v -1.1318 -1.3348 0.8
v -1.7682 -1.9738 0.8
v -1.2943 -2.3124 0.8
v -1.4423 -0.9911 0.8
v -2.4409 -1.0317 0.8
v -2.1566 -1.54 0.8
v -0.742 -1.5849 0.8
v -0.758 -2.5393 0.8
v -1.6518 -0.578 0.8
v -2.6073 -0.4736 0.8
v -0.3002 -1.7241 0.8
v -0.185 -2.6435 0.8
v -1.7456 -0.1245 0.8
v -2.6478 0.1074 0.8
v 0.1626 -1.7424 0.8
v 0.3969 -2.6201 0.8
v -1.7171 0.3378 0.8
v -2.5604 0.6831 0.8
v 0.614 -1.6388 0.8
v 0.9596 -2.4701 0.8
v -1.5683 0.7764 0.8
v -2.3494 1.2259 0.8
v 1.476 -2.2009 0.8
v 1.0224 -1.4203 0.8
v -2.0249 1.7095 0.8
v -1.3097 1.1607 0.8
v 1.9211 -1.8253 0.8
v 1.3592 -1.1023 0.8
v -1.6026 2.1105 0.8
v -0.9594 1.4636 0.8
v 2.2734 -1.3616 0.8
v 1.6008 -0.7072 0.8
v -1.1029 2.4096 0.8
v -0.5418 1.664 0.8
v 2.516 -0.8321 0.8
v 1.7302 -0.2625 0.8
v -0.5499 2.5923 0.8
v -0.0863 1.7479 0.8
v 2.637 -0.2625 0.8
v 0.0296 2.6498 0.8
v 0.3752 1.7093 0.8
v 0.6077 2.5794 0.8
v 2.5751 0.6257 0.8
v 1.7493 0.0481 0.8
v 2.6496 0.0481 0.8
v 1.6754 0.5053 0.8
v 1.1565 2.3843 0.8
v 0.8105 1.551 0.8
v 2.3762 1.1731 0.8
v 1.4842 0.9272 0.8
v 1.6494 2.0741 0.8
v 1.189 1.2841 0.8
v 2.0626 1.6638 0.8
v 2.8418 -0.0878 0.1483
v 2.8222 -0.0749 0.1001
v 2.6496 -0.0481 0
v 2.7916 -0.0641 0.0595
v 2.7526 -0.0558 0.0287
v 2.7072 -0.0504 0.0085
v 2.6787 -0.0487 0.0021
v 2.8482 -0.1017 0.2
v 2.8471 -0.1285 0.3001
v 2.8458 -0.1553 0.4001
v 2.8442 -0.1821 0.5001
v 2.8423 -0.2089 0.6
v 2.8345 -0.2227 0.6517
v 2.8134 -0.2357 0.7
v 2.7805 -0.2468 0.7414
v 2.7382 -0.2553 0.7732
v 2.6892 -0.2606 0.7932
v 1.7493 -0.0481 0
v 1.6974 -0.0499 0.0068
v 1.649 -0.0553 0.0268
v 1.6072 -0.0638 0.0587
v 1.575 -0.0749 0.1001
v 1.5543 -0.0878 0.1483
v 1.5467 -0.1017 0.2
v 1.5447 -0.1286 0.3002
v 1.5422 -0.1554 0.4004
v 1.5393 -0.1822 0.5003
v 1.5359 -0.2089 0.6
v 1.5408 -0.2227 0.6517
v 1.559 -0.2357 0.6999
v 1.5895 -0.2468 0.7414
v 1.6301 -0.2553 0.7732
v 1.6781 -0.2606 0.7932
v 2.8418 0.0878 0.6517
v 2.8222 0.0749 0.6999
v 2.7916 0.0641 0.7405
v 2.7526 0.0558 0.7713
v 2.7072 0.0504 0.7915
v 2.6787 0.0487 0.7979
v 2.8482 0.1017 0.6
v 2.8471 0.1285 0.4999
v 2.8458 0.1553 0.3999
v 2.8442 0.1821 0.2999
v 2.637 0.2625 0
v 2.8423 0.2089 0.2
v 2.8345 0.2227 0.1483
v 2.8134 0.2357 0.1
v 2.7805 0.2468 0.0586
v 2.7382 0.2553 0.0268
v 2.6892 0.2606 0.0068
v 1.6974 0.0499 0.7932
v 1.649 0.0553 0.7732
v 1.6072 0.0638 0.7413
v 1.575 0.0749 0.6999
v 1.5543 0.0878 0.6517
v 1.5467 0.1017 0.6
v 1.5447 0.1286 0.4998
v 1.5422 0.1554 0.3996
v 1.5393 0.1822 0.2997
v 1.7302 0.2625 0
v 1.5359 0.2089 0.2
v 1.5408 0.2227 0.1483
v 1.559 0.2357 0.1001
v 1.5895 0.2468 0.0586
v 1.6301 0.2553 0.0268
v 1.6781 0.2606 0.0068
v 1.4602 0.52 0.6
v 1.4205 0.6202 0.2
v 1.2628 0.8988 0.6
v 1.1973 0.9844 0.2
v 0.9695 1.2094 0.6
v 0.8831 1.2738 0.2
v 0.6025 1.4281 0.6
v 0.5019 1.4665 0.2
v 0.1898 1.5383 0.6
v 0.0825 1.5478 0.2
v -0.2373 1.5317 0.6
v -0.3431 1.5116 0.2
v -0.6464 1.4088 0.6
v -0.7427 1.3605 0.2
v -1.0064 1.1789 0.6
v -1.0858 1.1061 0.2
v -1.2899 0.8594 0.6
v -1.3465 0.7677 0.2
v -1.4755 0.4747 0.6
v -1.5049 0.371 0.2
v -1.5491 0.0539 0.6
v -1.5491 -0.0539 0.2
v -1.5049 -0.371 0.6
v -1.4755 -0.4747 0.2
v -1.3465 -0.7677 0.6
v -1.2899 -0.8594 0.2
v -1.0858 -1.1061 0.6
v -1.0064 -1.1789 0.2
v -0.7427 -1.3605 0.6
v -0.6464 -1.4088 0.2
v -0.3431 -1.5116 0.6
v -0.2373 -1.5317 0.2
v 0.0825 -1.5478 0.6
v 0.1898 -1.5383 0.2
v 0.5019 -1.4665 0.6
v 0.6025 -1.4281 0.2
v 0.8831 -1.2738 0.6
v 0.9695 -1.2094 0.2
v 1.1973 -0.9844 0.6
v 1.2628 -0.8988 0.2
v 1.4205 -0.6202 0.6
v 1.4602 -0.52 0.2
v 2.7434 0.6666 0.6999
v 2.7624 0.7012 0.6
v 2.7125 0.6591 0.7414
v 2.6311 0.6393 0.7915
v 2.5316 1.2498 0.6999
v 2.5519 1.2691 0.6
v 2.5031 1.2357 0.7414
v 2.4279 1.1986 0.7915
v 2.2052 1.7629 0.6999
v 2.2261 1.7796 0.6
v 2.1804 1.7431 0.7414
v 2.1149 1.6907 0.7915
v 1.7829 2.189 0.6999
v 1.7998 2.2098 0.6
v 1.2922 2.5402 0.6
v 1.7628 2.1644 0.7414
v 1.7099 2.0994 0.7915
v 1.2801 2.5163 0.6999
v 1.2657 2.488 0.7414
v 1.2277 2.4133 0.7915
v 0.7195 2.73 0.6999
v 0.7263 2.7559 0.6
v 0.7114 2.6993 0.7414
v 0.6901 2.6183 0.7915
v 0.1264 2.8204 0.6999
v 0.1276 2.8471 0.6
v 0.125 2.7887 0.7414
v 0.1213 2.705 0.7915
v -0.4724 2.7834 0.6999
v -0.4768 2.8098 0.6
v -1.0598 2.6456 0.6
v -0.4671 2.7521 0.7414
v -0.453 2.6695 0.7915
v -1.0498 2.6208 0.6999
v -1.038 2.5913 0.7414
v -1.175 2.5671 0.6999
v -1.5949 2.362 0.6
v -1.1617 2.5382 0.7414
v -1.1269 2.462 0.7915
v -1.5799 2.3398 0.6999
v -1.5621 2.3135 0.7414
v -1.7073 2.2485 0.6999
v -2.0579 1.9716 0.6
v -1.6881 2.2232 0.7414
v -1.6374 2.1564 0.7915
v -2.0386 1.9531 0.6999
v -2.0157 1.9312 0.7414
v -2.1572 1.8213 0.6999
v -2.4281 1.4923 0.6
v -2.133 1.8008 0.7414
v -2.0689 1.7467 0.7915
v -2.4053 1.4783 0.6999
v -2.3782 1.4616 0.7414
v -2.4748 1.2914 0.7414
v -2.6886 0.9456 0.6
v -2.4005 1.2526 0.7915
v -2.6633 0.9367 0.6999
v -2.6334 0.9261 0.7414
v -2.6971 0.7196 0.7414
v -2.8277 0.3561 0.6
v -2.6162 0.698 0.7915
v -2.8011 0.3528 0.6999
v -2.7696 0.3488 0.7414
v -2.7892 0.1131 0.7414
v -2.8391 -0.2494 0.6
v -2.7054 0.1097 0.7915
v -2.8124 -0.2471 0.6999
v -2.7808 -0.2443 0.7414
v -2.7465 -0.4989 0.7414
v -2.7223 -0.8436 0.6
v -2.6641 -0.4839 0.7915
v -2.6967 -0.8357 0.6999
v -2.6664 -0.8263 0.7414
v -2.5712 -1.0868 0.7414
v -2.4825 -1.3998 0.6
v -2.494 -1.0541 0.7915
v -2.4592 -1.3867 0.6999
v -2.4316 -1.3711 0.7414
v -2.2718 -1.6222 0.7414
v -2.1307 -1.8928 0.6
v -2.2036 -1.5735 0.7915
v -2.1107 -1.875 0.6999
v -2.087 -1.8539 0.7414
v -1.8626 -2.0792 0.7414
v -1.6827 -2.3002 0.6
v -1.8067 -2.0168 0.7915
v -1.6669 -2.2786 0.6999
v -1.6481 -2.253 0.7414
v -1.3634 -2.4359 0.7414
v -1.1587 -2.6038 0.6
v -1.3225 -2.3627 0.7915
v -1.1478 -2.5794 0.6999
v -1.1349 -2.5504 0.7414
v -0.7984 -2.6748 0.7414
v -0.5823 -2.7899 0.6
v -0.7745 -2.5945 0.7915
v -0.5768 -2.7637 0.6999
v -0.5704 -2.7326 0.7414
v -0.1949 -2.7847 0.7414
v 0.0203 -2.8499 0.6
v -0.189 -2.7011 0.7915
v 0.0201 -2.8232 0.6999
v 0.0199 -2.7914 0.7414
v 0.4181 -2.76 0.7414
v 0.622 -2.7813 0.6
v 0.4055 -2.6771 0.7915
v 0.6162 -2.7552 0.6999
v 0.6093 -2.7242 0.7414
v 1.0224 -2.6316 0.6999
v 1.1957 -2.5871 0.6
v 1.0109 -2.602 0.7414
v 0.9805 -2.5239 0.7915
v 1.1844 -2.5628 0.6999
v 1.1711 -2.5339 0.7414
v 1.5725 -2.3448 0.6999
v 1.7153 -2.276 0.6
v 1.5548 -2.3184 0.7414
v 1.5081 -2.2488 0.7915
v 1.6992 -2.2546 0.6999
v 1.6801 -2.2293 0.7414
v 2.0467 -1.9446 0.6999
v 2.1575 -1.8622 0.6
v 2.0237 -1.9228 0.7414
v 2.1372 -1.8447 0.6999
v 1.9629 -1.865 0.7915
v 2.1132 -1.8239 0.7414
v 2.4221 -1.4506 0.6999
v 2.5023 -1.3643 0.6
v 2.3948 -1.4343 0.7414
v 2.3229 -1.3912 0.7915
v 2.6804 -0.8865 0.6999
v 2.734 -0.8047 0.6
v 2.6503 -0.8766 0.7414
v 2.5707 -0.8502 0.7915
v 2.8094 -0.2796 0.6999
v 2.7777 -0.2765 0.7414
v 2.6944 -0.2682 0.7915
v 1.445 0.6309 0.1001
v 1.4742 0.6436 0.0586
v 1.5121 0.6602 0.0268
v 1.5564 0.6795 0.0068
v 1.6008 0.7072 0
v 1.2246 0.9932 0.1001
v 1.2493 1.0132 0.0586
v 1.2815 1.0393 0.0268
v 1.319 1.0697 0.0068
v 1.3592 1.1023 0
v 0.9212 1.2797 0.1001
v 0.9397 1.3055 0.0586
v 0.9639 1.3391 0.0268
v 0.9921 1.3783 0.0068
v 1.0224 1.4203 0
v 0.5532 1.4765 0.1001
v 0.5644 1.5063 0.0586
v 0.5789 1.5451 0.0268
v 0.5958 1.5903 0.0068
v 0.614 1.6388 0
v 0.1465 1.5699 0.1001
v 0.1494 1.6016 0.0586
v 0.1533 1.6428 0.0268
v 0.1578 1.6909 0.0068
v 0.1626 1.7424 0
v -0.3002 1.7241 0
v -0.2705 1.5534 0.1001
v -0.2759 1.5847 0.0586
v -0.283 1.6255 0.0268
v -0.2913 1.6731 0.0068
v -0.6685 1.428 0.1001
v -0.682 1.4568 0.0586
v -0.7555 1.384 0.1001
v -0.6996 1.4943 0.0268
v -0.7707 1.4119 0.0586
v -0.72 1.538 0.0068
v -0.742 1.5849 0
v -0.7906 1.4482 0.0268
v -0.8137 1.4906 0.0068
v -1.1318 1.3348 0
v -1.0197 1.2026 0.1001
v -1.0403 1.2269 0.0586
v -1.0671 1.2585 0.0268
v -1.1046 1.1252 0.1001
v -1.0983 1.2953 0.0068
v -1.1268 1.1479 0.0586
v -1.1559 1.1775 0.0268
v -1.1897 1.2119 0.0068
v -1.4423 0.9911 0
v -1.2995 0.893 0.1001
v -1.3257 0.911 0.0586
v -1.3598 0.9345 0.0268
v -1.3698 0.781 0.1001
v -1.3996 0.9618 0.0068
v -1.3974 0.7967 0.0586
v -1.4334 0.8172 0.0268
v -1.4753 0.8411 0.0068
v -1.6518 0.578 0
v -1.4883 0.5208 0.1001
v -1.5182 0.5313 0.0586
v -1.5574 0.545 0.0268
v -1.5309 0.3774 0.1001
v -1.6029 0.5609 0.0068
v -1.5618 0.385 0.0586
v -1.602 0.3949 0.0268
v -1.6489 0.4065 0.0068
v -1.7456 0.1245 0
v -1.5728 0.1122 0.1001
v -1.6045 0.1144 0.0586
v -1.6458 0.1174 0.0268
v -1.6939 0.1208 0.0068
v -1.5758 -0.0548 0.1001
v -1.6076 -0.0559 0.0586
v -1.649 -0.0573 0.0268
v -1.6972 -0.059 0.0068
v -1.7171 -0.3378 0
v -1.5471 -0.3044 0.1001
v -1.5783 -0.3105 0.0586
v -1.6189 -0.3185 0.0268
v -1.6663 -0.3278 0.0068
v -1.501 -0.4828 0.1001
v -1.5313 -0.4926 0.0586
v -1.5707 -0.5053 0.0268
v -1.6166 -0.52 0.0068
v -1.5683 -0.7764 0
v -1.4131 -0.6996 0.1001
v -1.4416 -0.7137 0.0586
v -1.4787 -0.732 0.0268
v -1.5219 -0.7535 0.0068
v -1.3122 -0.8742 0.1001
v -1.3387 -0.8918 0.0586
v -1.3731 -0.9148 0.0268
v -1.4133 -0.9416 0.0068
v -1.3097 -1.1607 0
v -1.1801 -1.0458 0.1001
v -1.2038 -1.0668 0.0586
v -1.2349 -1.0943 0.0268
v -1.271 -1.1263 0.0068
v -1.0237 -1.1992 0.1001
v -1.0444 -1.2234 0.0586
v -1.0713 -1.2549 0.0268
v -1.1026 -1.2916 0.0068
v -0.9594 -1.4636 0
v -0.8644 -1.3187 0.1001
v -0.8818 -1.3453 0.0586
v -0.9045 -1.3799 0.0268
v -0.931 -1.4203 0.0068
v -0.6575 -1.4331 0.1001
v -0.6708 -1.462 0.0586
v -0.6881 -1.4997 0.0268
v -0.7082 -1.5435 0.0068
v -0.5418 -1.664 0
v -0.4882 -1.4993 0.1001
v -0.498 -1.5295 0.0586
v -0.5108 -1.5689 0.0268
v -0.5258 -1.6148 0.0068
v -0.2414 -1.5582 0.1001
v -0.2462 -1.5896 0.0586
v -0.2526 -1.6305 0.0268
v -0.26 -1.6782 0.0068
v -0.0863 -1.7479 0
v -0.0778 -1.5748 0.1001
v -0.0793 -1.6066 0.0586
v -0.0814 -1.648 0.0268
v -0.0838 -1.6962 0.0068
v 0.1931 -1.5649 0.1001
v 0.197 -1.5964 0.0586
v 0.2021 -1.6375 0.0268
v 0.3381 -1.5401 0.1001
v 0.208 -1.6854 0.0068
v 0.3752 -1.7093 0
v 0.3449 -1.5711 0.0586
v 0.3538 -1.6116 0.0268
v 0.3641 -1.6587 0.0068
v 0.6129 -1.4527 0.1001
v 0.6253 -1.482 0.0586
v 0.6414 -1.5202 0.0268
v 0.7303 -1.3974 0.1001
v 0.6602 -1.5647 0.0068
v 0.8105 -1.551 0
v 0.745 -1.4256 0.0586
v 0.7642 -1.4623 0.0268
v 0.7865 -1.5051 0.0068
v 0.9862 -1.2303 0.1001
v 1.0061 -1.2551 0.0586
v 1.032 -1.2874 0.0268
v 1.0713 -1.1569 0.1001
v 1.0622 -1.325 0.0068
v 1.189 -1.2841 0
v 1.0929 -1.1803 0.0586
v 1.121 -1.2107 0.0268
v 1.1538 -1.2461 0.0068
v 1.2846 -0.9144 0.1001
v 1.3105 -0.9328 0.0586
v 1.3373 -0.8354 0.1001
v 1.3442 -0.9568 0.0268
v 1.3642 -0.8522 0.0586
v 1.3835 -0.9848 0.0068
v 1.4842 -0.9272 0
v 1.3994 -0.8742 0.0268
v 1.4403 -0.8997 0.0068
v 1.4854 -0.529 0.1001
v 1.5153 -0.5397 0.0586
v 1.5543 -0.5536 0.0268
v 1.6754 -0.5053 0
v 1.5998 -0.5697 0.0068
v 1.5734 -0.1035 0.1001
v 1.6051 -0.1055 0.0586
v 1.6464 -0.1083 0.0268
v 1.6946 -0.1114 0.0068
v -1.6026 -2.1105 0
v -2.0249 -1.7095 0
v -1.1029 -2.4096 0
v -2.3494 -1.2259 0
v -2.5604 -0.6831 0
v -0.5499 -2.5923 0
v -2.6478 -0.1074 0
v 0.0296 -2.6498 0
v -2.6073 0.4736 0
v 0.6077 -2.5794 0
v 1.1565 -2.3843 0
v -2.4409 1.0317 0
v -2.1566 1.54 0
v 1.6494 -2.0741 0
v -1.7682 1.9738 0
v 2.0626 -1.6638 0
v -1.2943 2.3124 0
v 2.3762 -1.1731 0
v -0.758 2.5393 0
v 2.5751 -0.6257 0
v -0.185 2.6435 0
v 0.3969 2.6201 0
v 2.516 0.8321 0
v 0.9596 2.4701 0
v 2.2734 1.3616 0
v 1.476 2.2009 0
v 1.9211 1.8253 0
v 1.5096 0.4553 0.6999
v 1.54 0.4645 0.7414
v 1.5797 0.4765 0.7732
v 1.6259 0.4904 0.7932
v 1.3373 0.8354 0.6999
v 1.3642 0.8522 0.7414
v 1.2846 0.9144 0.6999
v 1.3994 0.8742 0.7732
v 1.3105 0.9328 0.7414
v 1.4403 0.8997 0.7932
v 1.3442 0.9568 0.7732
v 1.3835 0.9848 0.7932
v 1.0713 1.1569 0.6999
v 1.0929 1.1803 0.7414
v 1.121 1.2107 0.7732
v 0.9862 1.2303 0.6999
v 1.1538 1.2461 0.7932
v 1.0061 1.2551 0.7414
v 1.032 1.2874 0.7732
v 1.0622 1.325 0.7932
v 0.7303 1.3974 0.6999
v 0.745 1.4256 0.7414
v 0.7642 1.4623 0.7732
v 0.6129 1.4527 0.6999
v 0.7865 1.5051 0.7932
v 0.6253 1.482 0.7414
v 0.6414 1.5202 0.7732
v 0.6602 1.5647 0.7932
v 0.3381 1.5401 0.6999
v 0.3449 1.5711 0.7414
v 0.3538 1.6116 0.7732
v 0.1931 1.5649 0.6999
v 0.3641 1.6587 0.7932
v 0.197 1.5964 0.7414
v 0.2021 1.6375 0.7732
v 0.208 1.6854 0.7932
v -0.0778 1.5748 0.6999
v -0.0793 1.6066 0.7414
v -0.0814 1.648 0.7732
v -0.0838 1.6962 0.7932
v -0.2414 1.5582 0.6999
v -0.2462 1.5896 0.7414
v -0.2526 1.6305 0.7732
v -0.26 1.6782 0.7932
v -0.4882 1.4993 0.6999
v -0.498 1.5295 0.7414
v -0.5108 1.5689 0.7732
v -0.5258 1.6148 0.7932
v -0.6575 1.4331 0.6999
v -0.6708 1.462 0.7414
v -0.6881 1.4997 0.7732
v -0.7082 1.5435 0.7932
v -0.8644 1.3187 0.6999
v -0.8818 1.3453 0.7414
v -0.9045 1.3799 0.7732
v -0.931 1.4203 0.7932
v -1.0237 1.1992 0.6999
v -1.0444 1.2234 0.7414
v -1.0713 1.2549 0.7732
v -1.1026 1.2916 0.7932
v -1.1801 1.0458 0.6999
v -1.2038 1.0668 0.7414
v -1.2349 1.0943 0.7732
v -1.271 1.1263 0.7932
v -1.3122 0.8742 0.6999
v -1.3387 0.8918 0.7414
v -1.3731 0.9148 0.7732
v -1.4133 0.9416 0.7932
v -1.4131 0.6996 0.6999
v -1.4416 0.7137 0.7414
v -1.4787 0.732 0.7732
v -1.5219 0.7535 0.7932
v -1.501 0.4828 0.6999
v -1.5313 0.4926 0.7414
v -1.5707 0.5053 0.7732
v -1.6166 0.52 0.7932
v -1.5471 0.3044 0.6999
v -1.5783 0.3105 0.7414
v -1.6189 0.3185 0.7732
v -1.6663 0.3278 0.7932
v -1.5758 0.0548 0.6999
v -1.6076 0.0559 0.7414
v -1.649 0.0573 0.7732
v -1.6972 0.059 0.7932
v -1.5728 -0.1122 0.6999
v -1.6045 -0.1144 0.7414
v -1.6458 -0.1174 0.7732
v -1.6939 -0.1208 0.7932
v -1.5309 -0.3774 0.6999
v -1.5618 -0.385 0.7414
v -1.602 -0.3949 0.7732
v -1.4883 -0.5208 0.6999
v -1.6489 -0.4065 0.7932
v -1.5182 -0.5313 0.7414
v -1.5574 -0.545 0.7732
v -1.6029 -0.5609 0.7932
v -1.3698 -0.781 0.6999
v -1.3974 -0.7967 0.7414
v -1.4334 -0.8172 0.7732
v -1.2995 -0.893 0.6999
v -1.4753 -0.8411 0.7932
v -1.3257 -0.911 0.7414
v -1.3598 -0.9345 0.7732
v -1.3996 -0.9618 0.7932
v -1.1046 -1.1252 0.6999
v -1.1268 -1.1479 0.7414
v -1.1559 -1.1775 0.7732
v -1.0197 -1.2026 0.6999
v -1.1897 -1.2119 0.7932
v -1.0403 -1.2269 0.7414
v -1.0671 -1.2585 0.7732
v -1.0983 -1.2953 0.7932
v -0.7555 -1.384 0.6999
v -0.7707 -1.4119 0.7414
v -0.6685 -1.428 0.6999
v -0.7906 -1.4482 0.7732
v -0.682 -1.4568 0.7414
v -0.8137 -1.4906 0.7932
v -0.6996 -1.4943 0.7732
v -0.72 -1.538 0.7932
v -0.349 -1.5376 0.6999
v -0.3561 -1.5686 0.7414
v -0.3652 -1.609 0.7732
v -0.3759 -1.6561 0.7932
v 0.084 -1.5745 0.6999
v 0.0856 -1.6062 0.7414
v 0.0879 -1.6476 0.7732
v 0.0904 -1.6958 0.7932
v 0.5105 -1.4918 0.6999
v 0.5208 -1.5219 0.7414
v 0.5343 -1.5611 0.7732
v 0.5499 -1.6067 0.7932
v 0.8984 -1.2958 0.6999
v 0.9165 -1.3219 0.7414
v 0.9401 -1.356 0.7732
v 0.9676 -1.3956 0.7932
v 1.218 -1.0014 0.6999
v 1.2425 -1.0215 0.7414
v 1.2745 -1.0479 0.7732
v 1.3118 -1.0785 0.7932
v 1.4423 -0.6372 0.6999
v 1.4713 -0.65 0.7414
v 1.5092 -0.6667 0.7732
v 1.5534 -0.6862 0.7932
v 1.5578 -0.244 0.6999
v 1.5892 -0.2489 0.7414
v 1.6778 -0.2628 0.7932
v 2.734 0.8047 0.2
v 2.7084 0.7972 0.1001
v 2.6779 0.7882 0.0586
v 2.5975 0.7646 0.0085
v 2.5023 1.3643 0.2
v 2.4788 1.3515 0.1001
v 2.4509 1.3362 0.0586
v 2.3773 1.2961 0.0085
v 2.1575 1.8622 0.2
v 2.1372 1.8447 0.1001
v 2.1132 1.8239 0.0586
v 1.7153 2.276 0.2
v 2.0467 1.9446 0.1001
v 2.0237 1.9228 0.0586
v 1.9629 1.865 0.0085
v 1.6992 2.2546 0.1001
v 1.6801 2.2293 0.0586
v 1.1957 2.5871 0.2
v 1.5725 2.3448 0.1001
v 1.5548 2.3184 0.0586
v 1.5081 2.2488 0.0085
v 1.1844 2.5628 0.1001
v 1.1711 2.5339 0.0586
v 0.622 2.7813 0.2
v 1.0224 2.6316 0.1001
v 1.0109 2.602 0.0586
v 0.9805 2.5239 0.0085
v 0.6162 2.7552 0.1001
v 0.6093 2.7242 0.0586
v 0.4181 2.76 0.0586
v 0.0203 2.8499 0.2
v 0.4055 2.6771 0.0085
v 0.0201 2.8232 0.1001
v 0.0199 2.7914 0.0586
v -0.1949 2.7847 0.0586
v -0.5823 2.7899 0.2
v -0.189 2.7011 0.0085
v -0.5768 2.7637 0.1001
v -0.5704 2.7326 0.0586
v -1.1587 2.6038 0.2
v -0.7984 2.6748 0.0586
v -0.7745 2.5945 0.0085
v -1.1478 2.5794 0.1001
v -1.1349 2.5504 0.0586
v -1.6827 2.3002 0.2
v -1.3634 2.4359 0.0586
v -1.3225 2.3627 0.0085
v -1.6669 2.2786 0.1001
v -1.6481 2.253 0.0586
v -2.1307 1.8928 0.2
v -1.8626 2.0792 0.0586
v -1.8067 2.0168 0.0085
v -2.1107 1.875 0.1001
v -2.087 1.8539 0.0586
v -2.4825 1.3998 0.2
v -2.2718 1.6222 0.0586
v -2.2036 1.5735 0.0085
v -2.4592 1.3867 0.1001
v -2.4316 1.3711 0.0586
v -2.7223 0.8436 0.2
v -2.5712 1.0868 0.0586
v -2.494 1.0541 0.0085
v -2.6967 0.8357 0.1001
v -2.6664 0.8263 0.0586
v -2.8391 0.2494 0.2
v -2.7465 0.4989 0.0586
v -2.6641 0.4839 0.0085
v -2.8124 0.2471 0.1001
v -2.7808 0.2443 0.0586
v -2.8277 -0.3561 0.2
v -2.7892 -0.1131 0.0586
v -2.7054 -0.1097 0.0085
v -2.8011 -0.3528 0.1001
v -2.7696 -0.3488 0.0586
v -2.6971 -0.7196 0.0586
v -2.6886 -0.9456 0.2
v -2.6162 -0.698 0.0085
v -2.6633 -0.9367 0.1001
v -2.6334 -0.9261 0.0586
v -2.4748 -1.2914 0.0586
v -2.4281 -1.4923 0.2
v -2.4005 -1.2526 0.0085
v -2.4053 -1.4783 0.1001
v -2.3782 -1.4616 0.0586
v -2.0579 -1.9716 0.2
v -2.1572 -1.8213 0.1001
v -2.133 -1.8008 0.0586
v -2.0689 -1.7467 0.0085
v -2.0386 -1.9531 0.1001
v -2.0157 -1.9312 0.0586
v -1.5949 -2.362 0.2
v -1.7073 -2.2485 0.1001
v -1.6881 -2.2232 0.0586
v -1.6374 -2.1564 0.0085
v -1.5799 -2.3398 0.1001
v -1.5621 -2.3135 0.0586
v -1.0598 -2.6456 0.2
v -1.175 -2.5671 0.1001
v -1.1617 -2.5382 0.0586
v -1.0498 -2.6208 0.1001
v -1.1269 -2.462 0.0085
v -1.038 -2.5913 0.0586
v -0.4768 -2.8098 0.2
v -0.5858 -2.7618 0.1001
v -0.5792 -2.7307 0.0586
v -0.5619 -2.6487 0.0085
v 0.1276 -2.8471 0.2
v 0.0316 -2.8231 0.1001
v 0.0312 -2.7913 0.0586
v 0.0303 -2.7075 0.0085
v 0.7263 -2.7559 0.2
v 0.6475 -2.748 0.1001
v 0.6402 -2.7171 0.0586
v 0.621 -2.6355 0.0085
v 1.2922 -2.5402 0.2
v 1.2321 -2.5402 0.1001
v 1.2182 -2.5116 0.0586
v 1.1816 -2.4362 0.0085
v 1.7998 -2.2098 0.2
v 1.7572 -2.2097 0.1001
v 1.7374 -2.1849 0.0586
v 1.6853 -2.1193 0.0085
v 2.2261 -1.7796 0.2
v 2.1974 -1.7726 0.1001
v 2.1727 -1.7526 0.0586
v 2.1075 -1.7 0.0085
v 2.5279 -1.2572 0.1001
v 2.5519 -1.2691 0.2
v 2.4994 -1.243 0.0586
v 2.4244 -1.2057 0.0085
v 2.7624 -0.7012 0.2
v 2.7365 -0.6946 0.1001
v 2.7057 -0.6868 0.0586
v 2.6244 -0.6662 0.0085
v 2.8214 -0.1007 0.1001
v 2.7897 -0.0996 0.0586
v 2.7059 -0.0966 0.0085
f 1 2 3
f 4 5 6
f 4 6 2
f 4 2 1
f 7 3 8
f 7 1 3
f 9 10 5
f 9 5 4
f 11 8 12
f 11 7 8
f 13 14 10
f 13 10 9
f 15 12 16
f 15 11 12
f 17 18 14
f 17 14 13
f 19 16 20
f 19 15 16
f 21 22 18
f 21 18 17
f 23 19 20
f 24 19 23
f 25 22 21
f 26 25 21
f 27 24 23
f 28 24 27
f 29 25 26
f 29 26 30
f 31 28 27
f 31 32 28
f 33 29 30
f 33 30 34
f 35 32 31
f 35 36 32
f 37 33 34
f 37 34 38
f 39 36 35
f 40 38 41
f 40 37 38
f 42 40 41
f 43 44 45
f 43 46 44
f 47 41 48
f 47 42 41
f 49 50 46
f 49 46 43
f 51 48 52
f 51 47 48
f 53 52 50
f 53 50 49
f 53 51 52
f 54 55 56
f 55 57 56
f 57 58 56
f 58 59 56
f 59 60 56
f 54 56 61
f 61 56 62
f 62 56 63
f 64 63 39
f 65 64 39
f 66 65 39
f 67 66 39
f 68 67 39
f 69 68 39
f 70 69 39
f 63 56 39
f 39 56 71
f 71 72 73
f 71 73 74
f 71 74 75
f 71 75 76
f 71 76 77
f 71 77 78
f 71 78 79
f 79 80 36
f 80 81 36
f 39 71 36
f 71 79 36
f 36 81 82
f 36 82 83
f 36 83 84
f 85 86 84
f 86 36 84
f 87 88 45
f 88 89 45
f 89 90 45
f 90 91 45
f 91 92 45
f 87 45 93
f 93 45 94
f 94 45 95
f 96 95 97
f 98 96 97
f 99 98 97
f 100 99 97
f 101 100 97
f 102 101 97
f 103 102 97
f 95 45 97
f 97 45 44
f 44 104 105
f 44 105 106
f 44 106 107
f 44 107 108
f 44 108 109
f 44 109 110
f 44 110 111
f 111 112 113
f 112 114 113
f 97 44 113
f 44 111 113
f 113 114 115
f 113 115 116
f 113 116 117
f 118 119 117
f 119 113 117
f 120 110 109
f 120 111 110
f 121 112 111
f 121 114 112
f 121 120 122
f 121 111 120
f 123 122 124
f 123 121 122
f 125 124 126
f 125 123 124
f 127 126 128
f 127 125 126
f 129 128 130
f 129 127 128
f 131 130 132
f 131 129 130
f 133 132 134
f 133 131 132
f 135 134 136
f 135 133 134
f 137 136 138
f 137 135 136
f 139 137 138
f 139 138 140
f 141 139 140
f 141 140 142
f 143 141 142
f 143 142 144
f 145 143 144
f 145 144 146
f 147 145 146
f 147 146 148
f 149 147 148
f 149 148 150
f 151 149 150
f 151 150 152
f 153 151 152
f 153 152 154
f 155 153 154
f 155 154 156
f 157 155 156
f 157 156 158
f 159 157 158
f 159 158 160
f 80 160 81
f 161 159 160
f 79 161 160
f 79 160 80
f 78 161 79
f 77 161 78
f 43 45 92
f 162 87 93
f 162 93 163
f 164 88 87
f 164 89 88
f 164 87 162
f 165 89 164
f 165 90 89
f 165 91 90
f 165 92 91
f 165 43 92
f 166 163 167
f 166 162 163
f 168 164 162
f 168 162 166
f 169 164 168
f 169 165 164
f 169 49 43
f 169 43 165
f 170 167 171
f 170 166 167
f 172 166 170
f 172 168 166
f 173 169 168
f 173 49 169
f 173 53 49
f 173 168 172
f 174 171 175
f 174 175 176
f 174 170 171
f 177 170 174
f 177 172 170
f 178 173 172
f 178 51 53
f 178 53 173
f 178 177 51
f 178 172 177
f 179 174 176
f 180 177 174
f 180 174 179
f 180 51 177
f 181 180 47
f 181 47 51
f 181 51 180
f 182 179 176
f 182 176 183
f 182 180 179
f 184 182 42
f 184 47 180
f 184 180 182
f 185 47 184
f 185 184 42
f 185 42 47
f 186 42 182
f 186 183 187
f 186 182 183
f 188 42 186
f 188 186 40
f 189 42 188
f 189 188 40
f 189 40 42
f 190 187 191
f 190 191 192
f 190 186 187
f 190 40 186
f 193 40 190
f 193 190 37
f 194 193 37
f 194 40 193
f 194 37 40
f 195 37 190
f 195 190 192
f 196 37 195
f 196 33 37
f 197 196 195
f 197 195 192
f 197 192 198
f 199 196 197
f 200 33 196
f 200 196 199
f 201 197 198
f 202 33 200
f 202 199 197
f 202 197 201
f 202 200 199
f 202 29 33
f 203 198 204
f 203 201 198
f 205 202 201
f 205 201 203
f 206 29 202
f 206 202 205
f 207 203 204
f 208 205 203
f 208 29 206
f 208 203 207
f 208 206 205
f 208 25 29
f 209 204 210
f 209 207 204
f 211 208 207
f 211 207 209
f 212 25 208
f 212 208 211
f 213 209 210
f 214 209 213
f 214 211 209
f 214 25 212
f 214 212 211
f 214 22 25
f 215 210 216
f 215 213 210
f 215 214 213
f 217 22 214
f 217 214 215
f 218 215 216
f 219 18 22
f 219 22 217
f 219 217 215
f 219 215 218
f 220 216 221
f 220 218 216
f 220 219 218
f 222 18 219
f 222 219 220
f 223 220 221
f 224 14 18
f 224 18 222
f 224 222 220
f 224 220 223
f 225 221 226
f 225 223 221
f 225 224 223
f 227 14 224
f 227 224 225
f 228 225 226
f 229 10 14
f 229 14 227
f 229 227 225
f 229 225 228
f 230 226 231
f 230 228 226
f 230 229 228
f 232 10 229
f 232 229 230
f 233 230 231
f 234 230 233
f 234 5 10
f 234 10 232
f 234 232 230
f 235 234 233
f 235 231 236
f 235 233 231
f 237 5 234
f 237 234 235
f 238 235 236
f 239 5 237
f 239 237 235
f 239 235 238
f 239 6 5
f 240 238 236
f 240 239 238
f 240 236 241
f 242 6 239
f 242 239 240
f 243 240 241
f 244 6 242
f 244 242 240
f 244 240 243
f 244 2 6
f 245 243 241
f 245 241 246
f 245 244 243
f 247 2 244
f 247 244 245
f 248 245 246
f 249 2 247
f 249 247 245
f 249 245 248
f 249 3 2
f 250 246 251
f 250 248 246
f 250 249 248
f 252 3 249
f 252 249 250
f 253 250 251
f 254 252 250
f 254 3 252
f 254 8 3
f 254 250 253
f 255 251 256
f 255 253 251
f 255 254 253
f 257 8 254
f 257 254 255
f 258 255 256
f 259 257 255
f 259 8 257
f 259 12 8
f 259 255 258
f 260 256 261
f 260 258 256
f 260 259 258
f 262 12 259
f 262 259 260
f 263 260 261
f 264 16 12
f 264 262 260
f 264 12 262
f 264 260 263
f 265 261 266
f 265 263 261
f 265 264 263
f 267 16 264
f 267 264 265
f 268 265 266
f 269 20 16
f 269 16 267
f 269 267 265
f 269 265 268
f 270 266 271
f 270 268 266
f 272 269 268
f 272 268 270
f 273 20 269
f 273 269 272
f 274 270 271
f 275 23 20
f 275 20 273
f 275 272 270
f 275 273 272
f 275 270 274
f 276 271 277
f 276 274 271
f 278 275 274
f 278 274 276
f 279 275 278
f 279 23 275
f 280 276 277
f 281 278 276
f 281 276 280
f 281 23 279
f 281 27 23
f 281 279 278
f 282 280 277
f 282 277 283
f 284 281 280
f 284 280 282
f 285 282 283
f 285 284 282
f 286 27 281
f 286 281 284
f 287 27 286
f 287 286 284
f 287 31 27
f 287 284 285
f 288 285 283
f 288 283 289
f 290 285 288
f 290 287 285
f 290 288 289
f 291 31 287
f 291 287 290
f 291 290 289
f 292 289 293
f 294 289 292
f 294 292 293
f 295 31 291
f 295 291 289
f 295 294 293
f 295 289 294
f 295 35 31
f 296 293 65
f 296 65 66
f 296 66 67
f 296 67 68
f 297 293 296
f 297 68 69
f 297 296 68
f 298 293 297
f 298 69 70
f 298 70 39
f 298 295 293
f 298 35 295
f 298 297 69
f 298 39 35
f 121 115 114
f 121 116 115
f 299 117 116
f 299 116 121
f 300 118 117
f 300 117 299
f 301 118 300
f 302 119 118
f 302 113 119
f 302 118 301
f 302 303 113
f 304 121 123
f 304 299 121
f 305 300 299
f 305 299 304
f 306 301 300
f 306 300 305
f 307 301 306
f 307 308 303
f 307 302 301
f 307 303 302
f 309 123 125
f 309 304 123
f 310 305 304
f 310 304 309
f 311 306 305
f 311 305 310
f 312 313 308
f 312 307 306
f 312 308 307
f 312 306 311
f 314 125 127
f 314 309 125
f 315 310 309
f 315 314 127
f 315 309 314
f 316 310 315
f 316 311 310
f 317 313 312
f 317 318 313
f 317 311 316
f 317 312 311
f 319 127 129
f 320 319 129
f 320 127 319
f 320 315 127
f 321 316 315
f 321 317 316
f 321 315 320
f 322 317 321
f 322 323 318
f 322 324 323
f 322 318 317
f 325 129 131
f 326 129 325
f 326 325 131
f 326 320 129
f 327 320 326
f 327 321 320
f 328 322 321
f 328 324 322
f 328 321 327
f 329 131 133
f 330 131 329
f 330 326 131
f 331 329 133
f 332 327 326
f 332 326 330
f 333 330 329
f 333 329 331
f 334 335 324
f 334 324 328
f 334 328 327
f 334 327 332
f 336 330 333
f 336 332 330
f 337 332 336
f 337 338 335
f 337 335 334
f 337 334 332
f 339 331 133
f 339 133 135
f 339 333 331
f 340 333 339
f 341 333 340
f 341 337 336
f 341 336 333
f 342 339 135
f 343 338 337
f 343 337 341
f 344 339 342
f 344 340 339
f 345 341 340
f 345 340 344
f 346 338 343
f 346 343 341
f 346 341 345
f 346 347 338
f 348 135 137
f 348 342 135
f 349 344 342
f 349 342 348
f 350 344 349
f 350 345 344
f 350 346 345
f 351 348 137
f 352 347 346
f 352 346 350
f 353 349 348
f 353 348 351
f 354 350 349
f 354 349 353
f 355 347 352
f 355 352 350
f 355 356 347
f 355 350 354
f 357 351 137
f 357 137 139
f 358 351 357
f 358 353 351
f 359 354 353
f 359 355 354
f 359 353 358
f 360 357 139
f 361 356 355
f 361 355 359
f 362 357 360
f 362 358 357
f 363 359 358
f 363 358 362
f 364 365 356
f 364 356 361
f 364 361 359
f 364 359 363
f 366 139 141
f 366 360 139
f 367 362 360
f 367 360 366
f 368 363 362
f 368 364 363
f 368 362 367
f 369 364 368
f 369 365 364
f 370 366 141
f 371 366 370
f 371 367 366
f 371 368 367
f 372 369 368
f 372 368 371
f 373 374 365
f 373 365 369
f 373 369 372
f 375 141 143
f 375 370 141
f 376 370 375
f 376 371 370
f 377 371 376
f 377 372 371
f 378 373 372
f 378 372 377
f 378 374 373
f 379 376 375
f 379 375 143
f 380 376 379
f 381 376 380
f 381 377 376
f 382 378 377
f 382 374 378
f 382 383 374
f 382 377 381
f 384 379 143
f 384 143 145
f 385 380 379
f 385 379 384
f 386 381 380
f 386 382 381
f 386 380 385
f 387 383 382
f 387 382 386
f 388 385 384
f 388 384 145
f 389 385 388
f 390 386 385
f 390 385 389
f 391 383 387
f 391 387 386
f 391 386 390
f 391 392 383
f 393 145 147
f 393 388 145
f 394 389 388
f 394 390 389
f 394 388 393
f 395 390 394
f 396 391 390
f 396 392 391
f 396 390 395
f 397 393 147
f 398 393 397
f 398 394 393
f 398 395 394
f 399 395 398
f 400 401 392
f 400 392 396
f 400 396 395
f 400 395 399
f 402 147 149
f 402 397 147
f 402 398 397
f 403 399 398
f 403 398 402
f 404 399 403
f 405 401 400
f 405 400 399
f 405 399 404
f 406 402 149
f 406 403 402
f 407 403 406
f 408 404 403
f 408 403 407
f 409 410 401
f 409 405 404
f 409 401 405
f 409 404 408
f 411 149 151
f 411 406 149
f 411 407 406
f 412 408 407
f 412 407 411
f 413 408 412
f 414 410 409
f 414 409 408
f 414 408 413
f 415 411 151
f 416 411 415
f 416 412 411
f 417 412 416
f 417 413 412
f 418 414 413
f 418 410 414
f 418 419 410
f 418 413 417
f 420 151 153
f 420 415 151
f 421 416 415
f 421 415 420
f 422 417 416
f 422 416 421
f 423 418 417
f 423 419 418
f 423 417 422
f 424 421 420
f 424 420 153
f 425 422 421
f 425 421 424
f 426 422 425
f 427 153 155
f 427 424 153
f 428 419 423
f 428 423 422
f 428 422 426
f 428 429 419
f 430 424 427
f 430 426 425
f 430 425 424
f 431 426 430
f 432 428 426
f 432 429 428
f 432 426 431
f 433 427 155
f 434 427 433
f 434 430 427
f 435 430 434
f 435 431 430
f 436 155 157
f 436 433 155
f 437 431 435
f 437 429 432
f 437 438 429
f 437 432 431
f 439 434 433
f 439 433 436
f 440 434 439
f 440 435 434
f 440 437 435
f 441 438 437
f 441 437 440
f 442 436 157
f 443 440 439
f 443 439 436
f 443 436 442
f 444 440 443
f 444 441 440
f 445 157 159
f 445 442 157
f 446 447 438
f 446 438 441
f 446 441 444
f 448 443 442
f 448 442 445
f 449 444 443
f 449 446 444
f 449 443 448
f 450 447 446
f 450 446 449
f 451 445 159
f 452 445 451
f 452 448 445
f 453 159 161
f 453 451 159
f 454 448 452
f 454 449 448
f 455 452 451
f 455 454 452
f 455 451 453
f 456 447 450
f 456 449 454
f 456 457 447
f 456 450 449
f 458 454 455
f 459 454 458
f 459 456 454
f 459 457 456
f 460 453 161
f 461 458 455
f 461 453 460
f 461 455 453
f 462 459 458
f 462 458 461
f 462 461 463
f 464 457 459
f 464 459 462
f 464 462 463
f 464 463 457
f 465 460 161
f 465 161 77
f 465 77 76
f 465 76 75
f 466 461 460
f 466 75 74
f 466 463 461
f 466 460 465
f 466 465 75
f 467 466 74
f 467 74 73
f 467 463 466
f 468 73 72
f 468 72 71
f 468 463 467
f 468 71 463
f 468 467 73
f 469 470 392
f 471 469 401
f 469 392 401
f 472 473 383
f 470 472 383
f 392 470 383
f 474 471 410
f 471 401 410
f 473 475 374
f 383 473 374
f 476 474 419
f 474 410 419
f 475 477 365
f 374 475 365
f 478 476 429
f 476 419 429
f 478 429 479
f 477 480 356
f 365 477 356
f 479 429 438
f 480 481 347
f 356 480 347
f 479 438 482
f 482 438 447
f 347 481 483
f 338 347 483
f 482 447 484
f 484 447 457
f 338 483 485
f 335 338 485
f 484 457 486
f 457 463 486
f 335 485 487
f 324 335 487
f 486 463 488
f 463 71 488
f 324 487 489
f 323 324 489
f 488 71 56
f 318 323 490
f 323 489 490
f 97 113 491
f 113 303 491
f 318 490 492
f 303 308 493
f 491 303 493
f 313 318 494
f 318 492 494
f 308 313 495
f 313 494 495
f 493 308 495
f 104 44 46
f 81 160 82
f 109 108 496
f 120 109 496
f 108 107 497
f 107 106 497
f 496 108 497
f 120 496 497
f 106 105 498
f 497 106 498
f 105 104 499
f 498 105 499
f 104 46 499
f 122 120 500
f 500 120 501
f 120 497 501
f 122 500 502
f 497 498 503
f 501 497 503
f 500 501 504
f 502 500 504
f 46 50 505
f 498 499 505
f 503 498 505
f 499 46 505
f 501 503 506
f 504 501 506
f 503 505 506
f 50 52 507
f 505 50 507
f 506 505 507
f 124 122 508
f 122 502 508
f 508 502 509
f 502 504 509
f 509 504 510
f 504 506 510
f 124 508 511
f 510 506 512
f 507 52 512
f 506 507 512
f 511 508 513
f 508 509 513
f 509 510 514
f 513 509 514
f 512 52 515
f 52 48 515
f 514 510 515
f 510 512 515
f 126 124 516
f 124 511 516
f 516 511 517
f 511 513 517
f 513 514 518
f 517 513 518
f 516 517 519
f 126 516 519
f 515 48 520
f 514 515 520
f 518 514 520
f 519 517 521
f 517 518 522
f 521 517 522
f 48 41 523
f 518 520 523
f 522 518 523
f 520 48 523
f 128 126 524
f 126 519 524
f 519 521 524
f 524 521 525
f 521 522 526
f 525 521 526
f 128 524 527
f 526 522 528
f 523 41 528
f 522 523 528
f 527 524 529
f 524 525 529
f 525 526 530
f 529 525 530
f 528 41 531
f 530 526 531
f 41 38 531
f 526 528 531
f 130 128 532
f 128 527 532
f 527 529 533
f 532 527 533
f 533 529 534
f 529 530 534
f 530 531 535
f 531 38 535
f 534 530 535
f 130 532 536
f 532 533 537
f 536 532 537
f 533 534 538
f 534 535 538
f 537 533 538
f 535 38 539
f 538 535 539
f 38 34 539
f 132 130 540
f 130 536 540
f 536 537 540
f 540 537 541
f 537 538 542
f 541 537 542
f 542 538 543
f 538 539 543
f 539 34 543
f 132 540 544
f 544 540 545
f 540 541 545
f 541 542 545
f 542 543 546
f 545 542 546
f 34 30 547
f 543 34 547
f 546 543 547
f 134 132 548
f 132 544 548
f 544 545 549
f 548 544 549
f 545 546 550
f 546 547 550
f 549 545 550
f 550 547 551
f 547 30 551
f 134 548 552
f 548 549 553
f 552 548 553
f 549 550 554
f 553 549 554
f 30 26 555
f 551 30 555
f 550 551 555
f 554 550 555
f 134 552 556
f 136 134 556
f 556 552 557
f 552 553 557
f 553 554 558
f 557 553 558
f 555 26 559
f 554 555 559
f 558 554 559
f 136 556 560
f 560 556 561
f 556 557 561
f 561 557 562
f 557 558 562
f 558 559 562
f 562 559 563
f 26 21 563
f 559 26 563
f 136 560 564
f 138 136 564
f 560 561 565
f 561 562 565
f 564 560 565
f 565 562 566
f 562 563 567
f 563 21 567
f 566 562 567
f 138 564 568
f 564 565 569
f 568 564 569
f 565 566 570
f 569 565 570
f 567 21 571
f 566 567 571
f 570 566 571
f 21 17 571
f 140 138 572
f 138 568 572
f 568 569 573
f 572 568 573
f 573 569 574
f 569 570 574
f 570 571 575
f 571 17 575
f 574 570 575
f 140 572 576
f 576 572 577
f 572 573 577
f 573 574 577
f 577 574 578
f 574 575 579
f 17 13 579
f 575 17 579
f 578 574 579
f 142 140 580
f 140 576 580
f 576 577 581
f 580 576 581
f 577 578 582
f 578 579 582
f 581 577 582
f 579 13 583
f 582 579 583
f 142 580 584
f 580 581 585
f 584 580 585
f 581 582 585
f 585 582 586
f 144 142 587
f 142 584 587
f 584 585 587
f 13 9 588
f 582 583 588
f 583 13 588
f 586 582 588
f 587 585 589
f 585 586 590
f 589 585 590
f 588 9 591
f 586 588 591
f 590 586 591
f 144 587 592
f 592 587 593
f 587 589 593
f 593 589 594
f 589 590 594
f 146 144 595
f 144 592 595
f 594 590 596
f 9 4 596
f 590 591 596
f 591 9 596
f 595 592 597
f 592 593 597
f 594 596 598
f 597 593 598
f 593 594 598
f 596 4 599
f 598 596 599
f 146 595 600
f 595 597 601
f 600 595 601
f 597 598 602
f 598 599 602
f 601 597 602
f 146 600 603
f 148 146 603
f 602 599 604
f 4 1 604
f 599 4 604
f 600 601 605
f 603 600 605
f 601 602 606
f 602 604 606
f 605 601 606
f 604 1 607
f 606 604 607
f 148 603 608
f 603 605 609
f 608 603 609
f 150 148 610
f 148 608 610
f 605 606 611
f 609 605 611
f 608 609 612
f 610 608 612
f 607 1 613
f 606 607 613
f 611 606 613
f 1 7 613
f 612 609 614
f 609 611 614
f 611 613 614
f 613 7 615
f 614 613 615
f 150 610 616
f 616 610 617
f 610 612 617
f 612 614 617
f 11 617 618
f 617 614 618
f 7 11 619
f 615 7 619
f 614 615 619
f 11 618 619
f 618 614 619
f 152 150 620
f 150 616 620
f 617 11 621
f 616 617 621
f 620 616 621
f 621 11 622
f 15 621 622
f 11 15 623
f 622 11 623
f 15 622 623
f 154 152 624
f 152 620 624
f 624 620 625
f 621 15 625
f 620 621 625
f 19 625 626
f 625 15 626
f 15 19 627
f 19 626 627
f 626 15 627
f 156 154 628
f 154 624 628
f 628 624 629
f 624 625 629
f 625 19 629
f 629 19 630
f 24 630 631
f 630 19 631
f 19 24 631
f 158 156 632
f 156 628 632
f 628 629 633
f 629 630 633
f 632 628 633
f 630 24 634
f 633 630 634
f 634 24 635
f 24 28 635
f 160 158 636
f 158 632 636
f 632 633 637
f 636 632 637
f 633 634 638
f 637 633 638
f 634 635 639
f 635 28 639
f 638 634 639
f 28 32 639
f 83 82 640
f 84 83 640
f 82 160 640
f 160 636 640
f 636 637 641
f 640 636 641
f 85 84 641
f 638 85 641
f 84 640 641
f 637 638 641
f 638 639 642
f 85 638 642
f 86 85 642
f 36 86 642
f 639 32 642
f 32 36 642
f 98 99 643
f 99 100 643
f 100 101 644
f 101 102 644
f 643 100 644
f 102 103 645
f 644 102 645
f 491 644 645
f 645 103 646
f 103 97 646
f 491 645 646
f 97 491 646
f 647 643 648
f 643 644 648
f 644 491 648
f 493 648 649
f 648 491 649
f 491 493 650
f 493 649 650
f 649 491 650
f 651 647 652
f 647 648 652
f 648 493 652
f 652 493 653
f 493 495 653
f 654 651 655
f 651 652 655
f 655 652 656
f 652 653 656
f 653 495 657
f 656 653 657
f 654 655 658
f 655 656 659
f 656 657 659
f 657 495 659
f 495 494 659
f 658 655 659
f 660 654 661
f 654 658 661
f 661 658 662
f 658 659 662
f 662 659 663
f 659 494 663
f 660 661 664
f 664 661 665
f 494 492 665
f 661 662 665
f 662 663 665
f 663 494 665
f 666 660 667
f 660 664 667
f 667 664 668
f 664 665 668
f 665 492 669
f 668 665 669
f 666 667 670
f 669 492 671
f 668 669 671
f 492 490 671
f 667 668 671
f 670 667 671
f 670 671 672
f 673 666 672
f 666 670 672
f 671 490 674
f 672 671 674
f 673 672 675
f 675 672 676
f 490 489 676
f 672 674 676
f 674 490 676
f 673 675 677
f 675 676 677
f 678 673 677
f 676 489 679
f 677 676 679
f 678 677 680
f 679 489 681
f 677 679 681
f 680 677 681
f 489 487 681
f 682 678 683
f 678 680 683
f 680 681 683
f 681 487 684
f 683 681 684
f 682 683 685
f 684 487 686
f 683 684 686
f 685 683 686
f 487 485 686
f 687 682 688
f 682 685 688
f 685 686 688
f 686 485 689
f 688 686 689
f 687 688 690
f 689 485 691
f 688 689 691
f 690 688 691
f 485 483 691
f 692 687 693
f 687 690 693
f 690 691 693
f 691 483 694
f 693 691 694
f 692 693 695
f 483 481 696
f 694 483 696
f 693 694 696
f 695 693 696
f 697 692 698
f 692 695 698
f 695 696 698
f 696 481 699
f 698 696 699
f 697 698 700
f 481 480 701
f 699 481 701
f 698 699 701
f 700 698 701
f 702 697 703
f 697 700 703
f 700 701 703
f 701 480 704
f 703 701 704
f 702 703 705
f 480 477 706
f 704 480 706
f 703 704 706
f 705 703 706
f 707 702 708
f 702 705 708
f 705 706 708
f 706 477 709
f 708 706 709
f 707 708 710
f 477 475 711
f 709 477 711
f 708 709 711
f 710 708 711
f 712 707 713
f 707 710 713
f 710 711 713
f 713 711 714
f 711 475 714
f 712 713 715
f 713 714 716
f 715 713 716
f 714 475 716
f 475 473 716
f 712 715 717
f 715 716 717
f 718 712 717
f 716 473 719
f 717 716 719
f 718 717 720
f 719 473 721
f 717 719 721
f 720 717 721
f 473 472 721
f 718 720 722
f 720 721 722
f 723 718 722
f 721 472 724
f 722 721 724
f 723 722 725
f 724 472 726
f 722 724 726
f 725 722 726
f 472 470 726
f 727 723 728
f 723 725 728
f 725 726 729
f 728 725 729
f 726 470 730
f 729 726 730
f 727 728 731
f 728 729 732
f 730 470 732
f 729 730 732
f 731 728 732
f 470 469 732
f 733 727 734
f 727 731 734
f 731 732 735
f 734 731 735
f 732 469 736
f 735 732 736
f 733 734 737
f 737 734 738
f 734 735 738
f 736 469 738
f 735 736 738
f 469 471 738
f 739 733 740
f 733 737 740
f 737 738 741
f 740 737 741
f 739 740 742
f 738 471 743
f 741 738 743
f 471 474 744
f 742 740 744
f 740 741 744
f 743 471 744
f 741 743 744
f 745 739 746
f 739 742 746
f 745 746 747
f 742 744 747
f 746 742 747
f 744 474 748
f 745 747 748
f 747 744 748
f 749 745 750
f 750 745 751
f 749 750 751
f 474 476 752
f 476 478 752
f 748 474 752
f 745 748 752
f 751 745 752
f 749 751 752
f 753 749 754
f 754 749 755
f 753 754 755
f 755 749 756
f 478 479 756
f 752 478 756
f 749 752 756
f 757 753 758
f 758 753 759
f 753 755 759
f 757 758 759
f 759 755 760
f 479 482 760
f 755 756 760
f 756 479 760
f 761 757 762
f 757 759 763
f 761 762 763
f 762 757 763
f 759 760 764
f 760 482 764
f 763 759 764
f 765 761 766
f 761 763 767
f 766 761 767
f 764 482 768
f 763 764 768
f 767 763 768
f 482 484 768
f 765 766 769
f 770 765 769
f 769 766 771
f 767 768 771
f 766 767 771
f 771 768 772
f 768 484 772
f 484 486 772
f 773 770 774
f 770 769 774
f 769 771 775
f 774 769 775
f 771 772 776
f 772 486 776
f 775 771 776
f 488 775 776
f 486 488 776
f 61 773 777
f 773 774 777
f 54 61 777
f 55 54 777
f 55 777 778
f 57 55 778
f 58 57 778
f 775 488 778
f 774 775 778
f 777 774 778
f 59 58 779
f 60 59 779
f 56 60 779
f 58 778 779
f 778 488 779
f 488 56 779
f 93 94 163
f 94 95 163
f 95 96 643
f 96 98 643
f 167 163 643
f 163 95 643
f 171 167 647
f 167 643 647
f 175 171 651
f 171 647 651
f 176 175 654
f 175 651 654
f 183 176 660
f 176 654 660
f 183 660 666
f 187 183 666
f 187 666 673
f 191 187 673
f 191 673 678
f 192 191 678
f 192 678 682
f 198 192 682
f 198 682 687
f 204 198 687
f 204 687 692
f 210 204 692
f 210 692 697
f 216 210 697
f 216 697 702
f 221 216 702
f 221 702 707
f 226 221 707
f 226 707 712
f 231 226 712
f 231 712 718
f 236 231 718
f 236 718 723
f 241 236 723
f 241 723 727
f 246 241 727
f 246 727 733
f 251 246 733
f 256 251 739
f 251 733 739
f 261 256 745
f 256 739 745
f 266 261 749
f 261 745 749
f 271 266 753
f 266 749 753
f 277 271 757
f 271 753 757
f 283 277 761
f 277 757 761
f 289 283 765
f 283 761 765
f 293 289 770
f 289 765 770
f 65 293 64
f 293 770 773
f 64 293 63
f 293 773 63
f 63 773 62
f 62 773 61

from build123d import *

# Parameters (mm, degrees)
SKICA1_R                 = 2.85
SKICA1_R_2               = 1.55
VYSUNOUT1_DEPTH          = 0.8
ZAOBLIT1_R               = 0.2
ODEBRAT_VYSUNUT_M1_DEPTH = 5.109136301


with BuildPart() as part:
    # Skica1 → Vysunout1 (new body)
    with BuildSketch(Plane.XY):
        Circle(SKICA1_R)
        Circle(SKICA1_R_2, mode=Mode.SUBTRACT)
    extrude(amount=VYSUNOUT1_DEPTH)

    # Zaoblit1
    zaoblit1_edges = [part.edges().sort_by_distance(p)[0] for p in [
        (-2.85, 0, 0),
        (-2.85, 0, 0.8),
        (-1.55, 0, 0),
        (-1.55, 0, 0.8),
    ]]
    fillet(zaoblit1_edges, radius=ZAOBLIT1_R)

    # Skica2 → Odebrat vysunutím1 (cut, through all)
    with BuildSketch(Plane(origin=(0, 0, 0), x_dir=(0, 0, -1), z_dir=(1, 0, 0))):
        Polygon((0, -0.04811175), (-0.8, -0.262471104), (-0.8, 0.04811175), (0, 0.262471104), align=None)
    extrude(amount=ODEBRAT_VYSUNUT_M1_DEPTH, mode=Mode.SUBTRACT)


solid = part.part
